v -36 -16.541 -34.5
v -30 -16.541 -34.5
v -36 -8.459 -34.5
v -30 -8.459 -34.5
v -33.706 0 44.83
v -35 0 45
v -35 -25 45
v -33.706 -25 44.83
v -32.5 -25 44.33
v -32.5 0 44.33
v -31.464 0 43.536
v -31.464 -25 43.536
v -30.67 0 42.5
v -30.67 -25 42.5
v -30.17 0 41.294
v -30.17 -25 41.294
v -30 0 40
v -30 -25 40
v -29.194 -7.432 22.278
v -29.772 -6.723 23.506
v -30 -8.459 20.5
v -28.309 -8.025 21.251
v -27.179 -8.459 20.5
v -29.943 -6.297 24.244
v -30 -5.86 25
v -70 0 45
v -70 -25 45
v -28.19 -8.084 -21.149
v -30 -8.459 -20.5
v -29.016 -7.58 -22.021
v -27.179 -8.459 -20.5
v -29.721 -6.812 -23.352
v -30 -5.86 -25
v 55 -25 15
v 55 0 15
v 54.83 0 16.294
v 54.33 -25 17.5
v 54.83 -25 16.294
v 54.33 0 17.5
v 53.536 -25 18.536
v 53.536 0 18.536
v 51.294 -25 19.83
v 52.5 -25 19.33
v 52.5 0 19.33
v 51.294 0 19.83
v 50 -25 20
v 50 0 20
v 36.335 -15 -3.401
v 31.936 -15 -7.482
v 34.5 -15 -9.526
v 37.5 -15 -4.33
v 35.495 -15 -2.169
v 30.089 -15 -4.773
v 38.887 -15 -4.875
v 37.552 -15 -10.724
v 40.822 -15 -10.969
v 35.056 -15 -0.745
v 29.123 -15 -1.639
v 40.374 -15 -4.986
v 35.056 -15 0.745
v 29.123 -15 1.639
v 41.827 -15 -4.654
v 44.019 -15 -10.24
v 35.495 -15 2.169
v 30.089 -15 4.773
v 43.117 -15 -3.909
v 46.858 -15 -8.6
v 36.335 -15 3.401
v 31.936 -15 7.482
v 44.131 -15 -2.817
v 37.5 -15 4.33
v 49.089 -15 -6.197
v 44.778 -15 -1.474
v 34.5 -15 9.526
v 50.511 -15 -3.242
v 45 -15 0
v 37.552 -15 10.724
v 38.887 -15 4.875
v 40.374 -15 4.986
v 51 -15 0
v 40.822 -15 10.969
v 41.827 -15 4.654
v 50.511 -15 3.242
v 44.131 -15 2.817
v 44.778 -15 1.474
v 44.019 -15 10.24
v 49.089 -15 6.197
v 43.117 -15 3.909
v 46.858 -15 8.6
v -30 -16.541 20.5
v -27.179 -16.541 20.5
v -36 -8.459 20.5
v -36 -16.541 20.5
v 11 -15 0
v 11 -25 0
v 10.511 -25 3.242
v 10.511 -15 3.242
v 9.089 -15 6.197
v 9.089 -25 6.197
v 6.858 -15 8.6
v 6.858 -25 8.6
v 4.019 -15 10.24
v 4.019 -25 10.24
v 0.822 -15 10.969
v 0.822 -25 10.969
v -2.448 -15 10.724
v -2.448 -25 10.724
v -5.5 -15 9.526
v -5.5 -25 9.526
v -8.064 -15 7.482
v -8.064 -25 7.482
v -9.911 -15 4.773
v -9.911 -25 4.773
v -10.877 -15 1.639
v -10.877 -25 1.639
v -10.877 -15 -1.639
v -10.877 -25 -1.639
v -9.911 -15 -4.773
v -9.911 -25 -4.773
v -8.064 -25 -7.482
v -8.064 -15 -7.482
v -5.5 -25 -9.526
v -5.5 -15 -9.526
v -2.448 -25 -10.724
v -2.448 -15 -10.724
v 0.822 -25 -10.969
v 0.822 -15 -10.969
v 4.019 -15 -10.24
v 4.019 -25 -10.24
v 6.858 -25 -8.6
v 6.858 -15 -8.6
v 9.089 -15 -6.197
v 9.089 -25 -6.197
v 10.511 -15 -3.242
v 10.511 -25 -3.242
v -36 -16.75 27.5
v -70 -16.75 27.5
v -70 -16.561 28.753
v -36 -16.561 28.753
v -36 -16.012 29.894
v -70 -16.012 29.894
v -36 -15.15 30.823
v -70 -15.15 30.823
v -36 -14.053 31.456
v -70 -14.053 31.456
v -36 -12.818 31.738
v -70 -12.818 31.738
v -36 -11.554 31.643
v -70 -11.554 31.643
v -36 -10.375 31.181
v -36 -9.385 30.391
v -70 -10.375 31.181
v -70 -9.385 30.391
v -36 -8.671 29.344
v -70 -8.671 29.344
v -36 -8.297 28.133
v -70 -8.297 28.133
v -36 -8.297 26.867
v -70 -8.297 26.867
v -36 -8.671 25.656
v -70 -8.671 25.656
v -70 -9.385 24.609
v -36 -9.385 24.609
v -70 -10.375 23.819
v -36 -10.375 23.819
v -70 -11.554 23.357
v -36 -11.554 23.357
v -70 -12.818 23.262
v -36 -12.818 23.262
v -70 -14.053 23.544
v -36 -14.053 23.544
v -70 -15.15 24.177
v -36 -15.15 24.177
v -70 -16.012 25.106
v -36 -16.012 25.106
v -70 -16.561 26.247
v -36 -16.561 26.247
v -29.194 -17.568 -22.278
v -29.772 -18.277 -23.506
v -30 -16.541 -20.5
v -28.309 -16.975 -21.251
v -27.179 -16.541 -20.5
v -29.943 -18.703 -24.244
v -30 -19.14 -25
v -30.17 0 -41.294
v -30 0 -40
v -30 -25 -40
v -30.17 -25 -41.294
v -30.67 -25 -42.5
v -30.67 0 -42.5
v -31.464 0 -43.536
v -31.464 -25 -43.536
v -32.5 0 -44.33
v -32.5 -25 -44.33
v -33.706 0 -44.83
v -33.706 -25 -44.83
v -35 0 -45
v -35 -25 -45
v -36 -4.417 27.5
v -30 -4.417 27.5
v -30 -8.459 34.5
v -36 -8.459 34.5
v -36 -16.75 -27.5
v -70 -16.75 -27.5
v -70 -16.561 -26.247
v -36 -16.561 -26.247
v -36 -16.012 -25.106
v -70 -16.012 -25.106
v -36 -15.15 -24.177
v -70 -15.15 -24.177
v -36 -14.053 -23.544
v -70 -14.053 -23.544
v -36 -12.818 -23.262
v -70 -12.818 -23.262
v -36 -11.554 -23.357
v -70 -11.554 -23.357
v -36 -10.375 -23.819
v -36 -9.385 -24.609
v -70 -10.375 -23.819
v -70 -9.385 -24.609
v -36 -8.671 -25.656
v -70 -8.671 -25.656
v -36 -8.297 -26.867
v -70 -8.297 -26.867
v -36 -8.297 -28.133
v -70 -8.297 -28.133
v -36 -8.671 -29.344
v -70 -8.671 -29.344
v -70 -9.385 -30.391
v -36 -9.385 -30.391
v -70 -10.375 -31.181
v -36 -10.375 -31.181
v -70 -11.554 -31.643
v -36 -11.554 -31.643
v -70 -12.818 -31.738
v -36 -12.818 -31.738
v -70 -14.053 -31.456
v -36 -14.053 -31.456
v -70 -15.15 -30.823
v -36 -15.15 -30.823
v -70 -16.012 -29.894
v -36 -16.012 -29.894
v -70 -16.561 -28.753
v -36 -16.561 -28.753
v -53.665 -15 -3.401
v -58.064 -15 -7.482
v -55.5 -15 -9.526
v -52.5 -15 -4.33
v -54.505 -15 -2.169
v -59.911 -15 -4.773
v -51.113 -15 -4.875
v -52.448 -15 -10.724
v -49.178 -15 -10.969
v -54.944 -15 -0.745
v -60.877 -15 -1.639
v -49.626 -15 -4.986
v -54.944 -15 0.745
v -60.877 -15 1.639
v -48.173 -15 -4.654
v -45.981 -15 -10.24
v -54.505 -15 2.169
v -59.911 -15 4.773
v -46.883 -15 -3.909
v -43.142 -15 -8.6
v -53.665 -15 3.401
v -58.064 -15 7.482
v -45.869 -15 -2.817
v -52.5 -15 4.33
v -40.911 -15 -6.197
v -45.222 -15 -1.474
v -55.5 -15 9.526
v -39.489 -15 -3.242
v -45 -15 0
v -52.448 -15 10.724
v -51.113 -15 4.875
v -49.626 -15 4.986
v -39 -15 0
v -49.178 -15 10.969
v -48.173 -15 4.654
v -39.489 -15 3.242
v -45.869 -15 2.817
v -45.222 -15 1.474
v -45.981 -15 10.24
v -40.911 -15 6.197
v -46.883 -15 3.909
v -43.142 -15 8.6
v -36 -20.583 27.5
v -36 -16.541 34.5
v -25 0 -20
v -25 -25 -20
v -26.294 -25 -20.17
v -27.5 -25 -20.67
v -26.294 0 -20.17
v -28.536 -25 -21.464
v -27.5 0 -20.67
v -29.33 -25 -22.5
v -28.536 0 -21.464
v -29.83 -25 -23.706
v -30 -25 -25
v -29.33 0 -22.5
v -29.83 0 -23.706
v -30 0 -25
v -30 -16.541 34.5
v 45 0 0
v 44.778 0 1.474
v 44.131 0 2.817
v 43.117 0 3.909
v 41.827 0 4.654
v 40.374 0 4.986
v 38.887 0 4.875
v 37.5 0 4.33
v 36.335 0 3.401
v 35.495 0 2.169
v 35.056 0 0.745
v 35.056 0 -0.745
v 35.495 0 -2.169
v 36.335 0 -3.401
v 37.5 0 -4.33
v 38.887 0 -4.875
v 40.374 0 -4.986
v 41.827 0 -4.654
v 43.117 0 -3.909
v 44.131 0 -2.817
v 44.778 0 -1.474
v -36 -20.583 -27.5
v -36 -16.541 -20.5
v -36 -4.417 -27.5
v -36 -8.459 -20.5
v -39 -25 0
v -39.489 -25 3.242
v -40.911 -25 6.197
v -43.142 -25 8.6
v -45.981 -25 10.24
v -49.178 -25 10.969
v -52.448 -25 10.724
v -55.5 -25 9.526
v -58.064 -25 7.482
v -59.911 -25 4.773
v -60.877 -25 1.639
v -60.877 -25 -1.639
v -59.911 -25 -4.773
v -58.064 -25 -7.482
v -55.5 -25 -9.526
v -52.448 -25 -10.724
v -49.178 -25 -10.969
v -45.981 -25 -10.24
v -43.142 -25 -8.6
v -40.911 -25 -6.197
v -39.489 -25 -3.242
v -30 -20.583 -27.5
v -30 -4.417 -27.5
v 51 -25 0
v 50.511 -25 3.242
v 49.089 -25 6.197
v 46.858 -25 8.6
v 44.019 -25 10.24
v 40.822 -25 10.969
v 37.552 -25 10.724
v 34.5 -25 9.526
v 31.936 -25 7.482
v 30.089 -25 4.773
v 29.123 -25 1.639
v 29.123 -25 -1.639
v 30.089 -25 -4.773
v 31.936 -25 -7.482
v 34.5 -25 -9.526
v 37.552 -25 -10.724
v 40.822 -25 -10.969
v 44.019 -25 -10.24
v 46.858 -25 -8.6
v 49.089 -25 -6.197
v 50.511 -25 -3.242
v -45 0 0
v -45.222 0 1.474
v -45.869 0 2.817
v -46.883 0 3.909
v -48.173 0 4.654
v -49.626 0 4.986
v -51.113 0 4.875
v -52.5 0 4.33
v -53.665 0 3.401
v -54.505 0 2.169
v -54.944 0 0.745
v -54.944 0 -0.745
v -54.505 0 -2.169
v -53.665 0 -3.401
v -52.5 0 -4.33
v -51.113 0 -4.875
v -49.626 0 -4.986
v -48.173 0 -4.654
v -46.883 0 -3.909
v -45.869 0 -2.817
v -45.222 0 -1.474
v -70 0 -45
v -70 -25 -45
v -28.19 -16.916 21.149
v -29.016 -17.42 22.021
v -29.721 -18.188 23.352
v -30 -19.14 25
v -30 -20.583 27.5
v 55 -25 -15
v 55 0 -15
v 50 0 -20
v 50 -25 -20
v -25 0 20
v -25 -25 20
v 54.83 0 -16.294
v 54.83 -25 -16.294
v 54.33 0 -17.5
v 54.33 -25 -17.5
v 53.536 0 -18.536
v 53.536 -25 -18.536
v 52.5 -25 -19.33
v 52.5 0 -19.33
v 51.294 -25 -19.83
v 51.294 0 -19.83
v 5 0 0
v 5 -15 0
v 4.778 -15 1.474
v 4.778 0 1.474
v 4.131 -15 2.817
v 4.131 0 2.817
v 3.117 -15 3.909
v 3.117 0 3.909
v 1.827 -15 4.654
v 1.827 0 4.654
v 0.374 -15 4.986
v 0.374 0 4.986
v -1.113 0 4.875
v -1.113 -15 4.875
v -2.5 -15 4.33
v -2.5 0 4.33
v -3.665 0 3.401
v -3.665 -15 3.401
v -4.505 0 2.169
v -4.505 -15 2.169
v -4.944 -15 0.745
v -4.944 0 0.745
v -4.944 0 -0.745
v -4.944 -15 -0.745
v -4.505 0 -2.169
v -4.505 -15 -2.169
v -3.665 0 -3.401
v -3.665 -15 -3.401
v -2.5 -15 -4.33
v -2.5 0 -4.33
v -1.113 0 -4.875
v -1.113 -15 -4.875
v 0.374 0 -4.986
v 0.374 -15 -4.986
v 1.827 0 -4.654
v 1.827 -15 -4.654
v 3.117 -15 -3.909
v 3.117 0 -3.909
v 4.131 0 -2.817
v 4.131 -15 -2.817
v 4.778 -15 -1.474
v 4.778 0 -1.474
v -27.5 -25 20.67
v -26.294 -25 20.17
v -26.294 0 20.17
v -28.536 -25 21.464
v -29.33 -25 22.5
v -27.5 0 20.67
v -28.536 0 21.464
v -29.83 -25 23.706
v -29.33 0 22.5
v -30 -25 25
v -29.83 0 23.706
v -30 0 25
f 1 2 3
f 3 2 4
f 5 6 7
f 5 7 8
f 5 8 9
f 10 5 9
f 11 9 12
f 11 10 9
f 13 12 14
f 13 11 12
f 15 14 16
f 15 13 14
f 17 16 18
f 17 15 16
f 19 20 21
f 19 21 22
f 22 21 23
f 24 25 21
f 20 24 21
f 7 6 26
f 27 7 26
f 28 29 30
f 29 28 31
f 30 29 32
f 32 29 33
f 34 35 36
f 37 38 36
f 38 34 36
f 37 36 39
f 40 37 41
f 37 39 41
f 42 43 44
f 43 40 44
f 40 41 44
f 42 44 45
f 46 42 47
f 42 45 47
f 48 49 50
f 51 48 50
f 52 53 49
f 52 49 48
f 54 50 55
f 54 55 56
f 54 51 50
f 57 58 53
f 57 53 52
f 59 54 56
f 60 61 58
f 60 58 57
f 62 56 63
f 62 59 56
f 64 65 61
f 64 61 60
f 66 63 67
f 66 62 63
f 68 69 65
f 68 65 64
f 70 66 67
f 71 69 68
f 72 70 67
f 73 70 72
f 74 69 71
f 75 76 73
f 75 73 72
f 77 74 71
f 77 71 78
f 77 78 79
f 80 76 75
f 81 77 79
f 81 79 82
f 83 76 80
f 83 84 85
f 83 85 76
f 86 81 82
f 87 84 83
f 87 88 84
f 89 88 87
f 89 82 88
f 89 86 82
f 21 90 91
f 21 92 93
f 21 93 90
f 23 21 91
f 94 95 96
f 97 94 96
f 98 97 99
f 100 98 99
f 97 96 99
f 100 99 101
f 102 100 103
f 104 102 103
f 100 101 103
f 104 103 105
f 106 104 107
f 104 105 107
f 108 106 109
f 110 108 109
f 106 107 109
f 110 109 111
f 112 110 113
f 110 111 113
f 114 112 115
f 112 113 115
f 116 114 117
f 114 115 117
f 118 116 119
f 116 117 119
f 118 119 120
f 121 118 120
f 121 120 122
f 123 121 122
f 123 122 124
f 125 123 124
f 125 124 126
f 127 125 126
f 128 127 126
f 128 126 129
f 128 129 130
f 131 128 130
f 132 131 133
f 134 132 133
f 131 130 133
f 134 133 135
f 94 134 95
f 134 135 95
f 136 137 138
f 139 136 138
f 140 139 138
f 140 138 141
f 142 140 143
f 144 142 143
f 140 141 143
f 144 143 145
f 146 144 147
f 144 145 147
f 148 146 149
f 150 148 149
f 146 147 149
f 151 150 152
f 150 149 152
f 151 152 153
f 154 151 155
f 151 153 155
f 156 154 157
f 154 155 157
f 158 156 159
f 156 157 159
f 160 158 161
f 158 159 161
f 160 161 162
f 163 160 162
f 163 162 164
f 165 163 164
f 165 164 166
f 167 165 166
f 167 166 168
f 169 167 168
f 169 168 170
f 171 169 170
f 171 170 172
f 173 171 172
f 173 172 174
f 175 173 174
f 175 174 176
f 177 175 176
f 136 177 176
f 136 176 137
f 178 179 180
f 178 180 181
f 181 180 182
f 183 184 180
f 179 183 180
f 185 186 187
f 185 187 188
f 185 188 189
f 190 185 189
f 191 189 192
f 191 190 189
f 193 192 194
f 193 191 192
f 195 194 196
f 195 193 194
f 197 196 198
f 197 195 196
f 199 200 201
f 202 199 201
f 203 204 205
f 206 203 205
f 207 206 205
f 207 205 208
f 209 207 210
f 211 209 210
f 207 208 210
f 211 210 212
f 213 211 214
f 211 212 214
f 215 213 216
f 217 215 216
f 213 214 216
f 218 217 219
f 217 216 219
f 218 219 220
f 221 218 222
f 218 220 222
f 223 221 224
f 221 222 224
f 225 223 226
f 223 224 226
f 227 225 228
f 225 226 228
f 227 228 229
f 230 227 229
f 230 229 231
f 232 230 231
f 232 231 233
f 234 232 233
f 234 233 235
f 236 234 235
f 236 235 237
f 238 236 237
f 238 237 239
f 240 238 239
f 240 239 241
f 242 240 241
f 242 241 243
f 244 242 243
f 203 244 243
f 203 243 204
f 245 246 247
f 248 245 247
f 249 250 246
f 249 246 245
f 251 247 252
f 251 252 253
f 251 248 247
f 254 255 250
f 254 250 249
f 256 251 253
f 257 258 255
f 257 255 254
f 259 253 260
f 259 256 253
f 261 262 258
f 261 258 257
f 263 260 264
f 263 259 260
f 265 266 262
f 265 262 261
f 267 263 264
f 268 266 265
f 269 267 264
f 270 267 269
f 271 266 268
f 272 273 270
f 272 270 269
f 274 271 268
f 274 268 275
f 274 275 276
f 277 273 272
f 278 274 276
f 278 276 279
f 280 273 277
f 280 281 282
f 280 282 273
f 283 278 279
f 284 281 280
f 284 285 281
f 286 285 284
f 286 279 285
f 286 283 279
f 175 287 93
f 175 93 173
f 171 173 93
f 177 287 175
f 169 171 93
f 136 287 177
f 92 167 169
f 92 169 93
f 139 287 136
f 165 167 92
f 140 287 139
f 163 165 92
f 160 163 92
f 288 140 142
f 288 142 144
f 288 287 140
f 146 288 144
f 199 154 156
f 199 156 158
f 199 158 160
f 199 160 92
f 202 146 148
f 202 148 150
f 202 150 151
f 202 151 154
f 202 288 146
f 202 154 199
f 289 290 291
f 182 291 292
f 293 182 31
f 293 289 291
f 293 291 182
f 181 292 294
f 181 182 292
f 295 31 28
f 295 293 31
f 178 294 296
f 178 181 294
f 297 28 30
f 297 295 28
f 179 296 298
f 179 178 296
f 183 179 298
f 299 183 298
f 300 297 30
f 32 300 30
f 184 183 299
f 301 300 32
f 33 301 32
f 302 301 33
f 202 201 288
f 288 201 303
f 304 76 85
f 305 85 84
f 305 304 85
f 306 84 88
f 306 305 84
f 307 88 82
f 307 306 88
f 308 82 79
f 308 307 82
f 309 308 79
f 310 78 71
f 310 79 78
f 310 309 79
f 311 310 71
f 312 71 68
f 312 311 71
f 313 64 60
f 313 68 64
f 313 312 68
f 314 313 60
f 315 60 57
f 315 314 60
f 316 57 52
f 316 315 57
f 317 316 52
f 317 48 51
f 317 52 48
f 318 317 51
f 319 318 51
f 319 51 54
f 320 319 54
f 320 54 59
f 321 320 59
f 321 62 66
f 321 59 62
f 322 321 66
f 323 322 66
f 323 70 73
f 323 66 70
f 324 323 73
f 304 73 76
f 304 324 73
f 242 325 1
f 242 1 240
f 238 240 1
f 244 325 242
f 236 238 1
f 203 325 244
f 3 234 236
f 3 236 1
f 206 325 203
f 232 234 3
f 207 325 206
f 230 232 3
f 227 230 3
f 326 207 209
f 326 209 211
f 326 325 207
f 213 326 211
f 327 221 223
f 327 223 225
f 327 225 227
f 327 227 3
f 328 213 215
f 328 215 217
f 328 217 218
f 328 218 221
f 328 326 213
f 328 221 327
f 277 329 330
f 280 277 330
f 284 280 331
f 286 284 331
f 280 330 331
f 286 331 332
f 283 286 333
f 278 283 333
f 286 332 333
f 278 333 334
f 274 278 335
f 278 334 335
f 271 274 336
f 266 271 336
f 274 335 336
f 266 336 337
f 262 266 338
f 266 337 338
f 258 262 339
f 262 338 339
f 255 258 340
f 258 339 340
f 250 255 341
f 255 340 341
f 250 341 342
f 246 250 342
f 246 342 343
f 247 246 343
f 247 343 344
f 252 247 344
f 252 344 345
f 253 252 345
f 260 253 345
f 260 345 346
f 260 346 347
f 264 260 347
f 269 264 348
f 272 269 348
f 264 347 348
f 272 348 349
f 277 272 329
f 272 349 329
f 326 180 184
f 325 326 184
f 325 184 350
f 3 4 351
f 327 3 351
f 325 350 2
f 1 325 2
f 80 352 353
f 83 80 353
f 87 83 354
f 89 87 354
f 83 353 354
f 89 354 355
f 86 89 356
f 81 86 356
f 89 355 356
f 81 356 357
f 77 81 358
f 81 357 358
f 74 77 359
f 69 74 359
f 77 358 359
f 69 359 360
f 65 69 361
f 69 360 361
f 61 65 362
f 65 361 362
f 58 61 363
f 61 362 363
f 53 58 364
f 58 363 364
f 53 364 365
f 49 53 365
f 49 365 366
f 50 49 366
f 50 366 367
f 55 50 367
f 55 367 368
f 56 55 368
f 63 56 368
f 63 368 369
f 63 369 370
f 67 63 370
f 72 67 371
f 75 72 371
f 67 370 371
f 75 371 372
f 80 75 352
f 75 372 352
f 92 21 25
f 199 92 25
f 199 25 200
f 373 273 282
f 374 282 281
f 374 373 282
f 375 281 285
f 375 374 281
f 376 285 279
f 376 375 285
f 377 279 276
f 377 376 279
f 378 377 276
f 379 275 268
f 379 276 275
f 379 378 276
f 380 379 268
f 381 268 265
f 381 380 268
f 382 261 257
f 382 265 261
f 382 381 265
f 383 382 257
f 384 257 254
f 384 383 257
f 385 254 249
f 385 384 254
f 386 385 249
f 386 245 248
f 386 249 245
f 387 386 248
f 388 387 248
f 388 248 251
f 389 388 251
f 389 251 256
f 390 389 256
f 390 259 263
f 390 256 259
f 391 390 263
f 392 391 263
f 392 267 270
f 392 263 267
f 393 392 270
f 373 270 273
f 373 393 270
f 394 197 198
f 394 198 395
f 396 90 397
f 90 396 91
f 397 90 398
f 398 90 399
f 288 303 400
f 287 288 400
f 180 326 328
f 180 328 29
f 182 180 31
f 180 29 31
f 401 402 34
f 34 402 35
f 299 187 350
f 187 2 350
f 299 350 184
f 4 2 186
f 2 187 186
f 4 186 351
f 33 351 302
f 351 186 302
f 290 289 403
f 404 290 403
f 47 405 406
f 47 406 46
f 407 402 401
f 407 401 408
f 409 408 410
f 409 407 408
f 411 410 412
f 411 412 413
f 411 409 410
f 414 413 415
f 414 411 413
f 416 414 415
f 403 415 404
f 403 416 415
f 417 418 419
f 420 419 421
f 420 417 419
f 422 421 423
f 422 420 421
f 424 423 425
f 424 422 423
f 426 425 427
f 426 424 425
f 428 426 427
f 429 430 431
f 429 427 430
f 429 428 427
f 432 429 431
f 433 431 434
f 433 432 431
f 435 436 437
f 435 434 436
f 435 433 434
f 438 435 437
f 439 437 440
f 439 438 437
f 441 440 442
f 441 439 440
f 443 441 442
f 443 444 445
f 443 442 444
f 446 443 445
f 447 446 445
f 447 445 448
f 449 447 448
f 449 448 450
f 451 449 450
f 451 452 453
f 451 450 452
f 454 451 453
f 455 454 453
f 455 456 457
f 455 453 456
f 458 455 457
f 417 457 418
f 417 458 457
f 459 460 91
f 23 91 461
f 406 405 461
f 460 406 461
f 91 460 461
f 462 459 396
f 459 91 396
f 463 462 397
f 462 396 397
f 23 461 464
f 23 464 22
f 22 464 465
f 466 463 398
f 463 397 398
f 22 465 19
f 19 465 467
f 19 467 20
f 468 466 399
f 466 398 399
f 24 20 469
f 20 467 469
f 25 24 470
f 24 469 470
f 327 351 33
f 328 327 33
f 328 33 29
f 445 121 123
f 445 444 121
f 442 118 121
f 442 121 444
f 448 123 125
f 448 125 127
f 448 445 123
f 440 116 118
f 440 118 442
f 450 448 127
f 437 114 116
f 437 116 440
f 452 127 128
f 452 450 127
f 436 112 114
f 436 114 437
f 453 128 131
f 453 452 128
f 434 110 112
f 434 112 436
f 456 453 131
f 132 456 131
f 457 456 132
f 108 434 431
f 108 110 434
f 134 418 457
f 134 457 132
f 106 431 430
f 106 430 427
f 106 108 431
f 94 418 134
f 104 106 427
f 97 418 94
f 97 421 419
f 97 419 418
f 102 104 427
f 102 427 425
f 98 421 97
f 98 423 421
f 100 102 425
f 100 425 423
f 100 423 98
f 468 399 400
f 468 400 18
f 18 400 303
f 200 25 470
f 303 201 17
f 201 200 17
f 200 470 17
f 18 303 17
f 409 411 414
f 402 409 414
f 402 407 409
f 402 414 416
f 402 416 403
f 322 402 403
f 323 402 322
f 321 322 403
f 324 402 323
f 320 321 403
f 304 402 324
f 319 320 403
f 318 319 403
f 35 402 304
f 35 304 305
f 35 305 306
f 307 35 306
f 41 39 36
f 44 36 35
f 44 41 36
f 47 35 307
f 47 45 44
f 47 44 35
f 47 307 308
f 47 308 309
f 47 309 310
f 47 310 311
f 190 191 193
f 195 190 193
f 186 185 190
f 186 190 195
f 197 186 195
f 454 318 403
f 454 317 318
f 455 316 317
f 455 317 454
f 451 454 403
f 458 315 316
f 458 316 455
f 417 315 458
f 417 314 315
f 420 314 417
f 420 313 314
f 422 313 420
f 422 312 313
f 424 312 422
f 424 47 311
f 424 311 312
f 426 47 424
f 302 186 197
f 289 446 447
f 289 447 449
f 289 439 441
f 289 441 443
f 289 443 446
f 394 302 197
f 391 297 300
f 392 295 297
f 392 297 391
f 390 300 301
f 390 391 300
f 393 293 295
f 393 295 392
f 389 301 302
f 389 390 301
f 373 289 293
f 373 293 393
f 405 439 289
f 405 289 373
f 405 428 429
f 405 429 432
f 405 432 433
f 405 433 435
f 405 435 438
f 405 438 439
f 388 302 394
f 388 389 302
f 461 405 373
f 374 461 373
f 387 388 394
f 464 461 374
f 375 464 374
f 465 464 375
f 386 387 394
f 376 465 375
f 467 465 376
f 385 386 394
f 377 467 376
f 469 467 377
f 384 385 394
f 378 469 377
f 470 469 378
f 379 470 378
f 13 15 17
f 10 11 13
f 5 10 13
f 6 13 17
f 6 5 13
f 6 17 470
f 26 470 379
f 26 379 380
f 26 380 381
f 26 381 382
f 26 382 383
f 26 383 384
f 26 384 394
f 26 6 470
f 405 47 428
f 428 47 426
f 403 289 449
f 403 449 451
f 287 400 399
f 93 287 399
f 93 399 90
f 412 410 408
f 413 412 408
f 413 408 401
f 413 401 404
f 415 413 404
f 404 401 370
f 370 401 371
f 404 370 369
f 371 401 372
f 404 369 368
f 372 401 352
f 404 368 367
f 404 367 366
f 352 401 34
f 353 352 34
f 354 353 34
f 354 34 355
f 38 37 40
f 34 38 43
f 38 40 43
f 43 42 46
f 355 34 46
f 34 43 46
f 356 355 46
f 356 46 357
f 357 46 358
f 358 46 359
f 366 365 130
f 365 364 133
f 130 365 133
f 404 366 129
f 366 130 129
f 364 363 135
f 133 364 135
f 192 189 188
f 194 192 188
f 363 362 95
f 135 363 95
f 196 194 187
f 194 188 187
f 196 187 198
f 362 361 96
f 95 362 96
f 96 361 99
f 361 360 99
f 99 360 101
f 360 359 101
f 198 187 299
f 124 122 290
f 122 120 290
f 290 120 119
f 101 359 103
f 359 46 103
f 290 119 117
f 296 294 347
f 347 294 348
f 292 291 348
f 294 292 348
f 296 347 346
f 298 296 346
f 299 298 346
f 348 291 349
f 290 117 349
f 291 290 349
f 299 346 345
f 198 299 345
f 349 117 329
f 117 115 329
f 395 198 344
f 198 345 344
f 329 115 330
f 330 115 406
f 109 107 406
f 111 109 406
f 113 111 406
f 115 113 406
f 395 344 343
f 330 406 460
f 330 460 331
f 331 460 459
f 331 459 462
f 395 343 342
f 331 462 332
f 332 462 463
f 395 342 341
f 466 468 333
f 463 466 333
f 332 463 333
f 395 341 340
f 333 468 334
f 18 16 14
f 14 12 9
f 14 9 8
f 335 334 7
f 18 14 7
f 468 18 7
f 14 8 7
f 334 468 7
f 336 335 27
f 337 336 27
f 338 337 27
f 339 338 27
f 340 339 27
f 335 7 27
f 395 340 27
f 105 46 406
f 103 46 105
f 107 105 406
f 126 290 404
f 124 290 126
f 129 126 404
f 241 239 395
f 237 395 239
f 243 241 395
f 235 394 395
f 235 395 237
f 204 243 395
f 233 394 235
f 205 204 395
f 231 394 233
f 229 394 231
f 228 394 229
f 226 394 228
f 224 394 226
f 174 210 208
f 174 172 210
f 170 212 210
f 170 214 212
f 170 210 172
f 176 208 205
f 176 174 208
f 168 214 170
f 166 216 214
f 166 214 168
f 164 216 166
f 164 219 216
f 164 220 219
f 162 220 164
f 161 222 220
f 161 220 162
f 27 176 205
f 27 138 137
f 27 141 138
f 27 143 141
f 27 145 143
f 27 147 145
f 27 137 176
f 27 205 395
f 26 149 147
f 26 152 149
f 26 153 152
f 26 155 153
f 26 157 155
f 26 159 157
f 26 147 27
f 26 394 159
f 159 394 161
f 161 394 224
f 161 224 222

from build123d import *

# Parameters (mm, degrees)
F0_W          = 125
F0_H          = 40
F0_R          = 5
F1_DEPTH      = 25
F2_R          = 11
F3_DEPTH      = 10
F4_W          = 40
F4_H          = 25
F5_DEPTH      = 25
F6_R          = 4.25
F7_DEPTH      = 40
F9_DEPTH      = 6
F10_T4_DEPTH  = 25
F10_T10_DEPTH = 25
F10_T16_DEPTH = 25
F10_T23_DEPTH = 25
F10_T29_DEPTH = 25
F10_T35_DEPTH = 25
F10_T41_DEPTH = 25
F10_T47_DEPTH = 25
F10_T54_DEPTH = 25
F10_T60_DEPTH = 25
F10_T63_DEPTH = 50


# Not quite as in the source:
# - a fillet or chamfer that OpenCascade refuses, or shapes differently, is made with other operations: its cross-section is extruded or revolved along the edge and cut away or added


with BuildPart() as f1:
    # F0 (on Front) → F1 (new body)
    with BuildSketch(Plane.XZ):
        with Locations((-7.5, 0)):
            Rectangle(F0_W, F0_H)
        with Locations((-50, 0)):
            Circle(F0_R, mode=Mode.SUBTRACT)
        Circle(F0_R, mode=Mode.SUBTRACT)
        with Locations((40, 0)):
            Circle(F0_R, mode=Mode.SUBTRACT)
    extrude(amount=F1_DEPTH)

    # F2 (on face) → F3 (cut)
    with BuildSketch(Plane.XZ.offset(25)):
        with Locations((-50, 0)):
            Circle(F2_R)
        Circle(F2_R)
        with Locations((40, 0)):
            Circle(F2_R)
    extrude(amount=-F3_DEPTH, mode=Mode.SUBTRACT)

    # F4 (on face) → F5 (join)
    with BuildSketch(Plane(origin=(0, 0, 0), x_dir=(-1, 0, 0), z_dir=(0, 1, 0))):
        with Locations((50, 32.5)):
            Rectangle(F4_W, F4_H)
        with Locations((50, -32.5)):
            Rectangle(F4_W, F4_H)
    extrude(amount=-F5_DEPTH)

    # F6 (on face) → F7 (cut, through all)
    with BuildSketch(Plane(origin=(-70, 0, 0), x_dir=(0, -1, 0), z_dir=(-1, 0, 0))):
        with Locations((12.5, 27.5)):
            Circle(F6_R)
        with Locations((12.5, -27.5)):
            Circle(F6_R)
    extrude(amount=-F7_DEPTH, mode=Mode.SUBTRACT)

    # F8 (on face) → F9 (cut)
    with BuildSketch(Plane.YZ.offset(-30)):
        Polygon((-8.4585481157, 34.5), (-16.5414518843, 34.5), (-20.5829037687, 27.5), (-16.5414518843, 20.5), (-8.4585481157, 20.5), (-4.4170962313, 27.5), align=None)
        Polygon((-8.4585481157, -20.5), (-16.5414518843, -20.5), (-20.5829037687, -27.5), (-16.5414518843, -34.5), (-8.4585481157, -34.5), (-4.4170962313, -27.5), align=None)
    extrude(amount=-F9_DEPTH, mode=Mode.SUBTRACT)

    # F10: fillet of radius 5 on 6 edges, made by hand


with BuildPart() as f10_tool2:
    # F10_s3 → F10_t4 (new body)
    with BuildSketch(Plane.XZ):
        with BuildLine():
            ThreePointArc((-25, 20), (-28.5355339059, 21.4644660941), (-30, 25))
            Line((-30, 25), (-30, 20))
            Line((-30, 20), (-25, 20))
        make_face()
    extrude(amount=F10_T4_DEPTH)

    split(bisect_by=Plane.XY.offset(20.5), keep=Keep.BOTTOM)

    split(bisect_by=Plane(origin=(0, -15.2206714755, 8.7876587737), x_dir=(1, 0, 0), z_dir=(0, 0.8660254038, -0.5)), keep=Keep.TOP)


with BuildPart() as f1_1:
    add(f1.part)

    # F10_t1: union F10_tool2
    add(f10_tool2.part)


with BuildPart() as f10_tool8:
    # F10_s9 → F10_t10 (new body)
    with BuildSketch(Plane.XZ):
        with BuildLine():
            ThreePointArc((-25, 20), (-28.5355339059, 21.4644660941), (-30, 25))
            Line((-30, 25), (-30, 20))
            Line((-30, 20), (-25, 20))
        make_face()
    extrude(amount=F10_T10_DEPTH)

    split(bisect_by=Plane.XY.offset(20.5), keep=Keep.TOP)

    split(bisect_by=Plane(origin=(0, -15.2206714755, 8.7876587737), x_dir=(1, 0, 0), z_dir=(0, 0.8660254038, -0.5)), keep=Keep.TOP)


with BuildPart() as f1_2:
    add(f1_1.part)

    # F10_t7: union F10_tool8
    add(f10_tool8.part)


with BuildPart() as f10_tool14:
    # F10_s15 → F10_t16 (new body)
    with BuildSketch(Plane.XZ):
        with BuildLine():
            ThreePointArc((-25, 20), (-28.5355339059, 21.4644660941), (-30, 25))
            Line((-30, 25), (-30, 20))
            Line((-30, 20), (-25, 20))
        make_face()
    extrude(amount=F10_T16_DEPTH)

    split(bisect_by=Plane(origin=(0, -3.5293285245, -2.0376587737), x_dir=(1, 0, 0), z_dir=(0, 0.8660254038, 0.5)), keep=Keep.TOP)

    split(bisect_by=Plane.XY.offset(20.5), keep=Keep.BOTTOM)

    split(bisect_by=Plane(origin=(0, -15.2206714755, 8.7876587737), x_dir=(1, 0, 0), z_dir=(0, -0.8660254038, 0.5)), keep=Keep.TOP)


with BuildPart() as f1_3:
    add(f1_2.part)

    # F10_t13: union F10_tool14
    add(f10_tool14.part)


with BuildPart() as f10_tool21:
    # F10_s22 → F10_t23 (new body)
    with BuildSketch(Plane.XZ):
        with BuildLine():
            ThreePointArc((-25, 20), (-28.5355339059, 21.4644660941), (-30, 25))
            Line((-30, 25), (-30, 20))
            Line((-30, 20), (-25, 20))
        make_face()
    extrude(amount=F10_T23_DEPTH)

    split(bisect_by=Plane(origin=(0, -3.5293285245, -2.0376587737), x_dir=(1, 0, 0), z_dir=(0, -0.8660254038, -0.5)), keep=Keep.TOP)

    split(bisect_by=Plane.XY.offset(20.5), keep=Keep.BOTTOM)


with BuildPart() as f1_4:
    add(f1_3.part)

    # F10_t20: union F10_tool21
    add(f10_tool21.part)


with BuildPart() as f10_tool27:
    # F10_s28 → F10_t29 (new body)
    with BuildSketch(Plane.XZ):
        with BuildLine():
            ThreePointArc((-25, 20), (-28.5355339059, 21.4644660941), (-30, 25))
            Line((-30, 25), (-30, 20))
            Line((-30, 20), (-25, 20))
        make_face()
    extrude(amount=F10_T29_DEPTH)

    split(bisect_by=Plane(origin=(0, -3.5293285245, -2.0376587737), x_dir=(1, 0, 0), z_dir=(0, -0.8660254038, -0.5)), keep=Keep.TOP)

    split(bisect_by=Plane.XY.offset(20.5), keep=Keep.TOP)


with BuildPart() as f1_5:
    add(f1_4.part)

    # F10_t26: union F10_tool27
    add(f10_tool27.part)


with BuildPart() as f10_tool33:
    # F10_s34 → F10_t35 (new body)
    with BuildSketch(Plane.XZ):
        with BuildLine():
            ThreePointArc((-25, -20), (-28.5355339059, -21.4644660941), (-30, -25))
            Line((-30, -25), (-30, -20))
            Line((-30, -20), (-25, -20))
        make_face()
    extrude(amount=F10_T35_DEPTH)

    split(bisect_by=Plane.XY.offset(-20.5), keep=Keep.TOP)

    split(bisect_by=Plane(origin=(0, -15.2206714755, -8.7876587737), x_dir=(1, 0, 0), z_dir=(0, 0.8660254038, 0.5)), keep=Keep.TOP)


with BuildPart() as f1_6:
    add(f1_5.part)

    # F10_t32: union F10_tool33
    add(f10_tool33.part)


with BuildPart() as f10_tool39:
    # F10_s40 → F10_t41 (new body)
    with BuildSketch(Plane.XZ):
        with BuildLine():
            ThreePointArc((-25, -20), (-28.5355339059, -21.4644660941), (-30, -25))
            Line((-30, -25), (-30, -20))
            Line((-30, -20), (-25, -20))
        make_face()
    extrude(amount=F10_T41_DEPTH)

    split(bisect_by=Plane.XY.offset(-20.5), keep=Keep.BOTTOM)

    split(bisect_by=Plane(origin=(0, -15.2206714755, -8.7876587737), x_dir=(1, 0, 0), z_dir=(0, 0.8660254038, 0.5)), keep=Keep.TOP)


with BuildPart() as f1_7:
    add(f1_6.part)

    # F10_t38: union F10_tool39
    add(f10_tool39.part)


with BuildPart() as f10_tool45:
    # F10_s46 → F10_t47 (new body)
    with BuildSketch(Plane.XZ):
        with BuildLine():
            ThreePointArc((-25, -20), (-28.5355339059, -21.4644660941), (-30, -25))
            Line((-30, -25), (-30, -20))
            Line((-30, -20), (-25, -20))
        make_face()
    extrude(amount=F10_T47_DEPTH)

    split(bisect_by=Plane.XY.offset(-20.5), keep=Keep.TOP)

    split(bisect_by=Plane(origin=(0, -3.5293285245, 2.0376587737), x_dir=(1, 0, 0), z_dir=(0, 0.8660254038, -0.5)), keep=Keep.TOP)

    split(bisect_by=Plane(origin=(0, -15.2206714755, -8.7876587737), x_dir=(1, 0, 0), z_dir=(0, -0.8660254038, -0.5)), keep=Keep.TOP)


with BuildPart() as f1_8:
    add(f1_7.part)

    # F10_t44: union F10_tool45
    add(f10_tool45.part)


with BuildPart() as f10_tool52:
    # F10_s53 → F10_t54 (new body)
    with BuildSketch(Plane.XZ):
        with BuildLine():
            ThreePointArc((-25, -20), (-28.5355339059, -21.4644660941), (-30, -25))
            Line((-30, -25), (-30, -20))
            Line((-30, -20), (-25, -20))
        make_face()
    extrude(amount=F10_T54_DEPTH)

    split(bisect_by=Plane.XY.offset(-20.5), keep=Keep.TOP)

    split(bisect_by=Plane(origin=(0, -3.5293285245, 2.0376587737), x_dir=(1, 0, 0), z_dir=(0, -0.8660254038, 0.5)), keep=Keep.TOP)


with BuildPart() as f1_9:
    add(f1_8.part)

    # F10_t51: union F10_tool52
    add(f10_tool52.part)


with BuildPart() as f10_tool58:
    # F10_s59 → F10_t60 (new body)
    with BuildSketch(Plane.XZ):
        with BuildLine():
            ThreePointArc((-25, -20), (-28.5355339059, -21.4644660941), (-30, -25))
            Line((-30, -25), (-30, -20))
            Line((-30, -20), (-25, -20))
        make_face()
    extrude(amount=F10_T60_DEPTH)

    split(bisect_by=Plane.XY.offset(-20.5), keep=Keep.BOTTOM)

    split(bisect_by=Plane(origin=(0, -3.5293285245, 2.0376587737), x_dir=(1, 0, 0), z_dir=(0, -0.8660254038, 0.5)), keep=Keep.TOP)


with BuildPart() as f1_10:
    add(f1_9.part)

    # F10_t57: union F10_tool58
    add(f10_tool58.part)

    # F10_s64 → F10_t63 (cut)
    with BuildSketch(Plane.XZ.offset(-12.5)):
        with BuildLine():
            ThreePointArc((-35, 45), (-31.4644660941, 43.5355339059), (-30, 40))
            Line((-30, 40), (-30, 45))
            Line((-30, 45), (-35, 45))
        make_face()
        with BuildLine():
            ThreePointArc((-30, -40), (-31.4644660941, -43.5355339059), (-35, -45))
            Line((-35, -45), (-30, -45))
            Line((-30, -45), (-30, -40))
        make_face()
        with BuildLine():
            ThreePointArc((55, -15), (53.5355339059, -18.5355339059), (50, -20))
            Line((50, -20), (55, -20))
            Line((55, -20), (55, -15))
        make_face()
        with BuildLine():
            ThreePointArc((55, 15), (53.5355339059, 18.5355339059), (50, 20))
            Line((50, 20), (55, 20))
            Line((55, 20), (55, 15))
        make_face()
    extrude(amount=F10_T63_DEPTH, mode=Mode.SUBTRACT)


solid = f1_10.part
